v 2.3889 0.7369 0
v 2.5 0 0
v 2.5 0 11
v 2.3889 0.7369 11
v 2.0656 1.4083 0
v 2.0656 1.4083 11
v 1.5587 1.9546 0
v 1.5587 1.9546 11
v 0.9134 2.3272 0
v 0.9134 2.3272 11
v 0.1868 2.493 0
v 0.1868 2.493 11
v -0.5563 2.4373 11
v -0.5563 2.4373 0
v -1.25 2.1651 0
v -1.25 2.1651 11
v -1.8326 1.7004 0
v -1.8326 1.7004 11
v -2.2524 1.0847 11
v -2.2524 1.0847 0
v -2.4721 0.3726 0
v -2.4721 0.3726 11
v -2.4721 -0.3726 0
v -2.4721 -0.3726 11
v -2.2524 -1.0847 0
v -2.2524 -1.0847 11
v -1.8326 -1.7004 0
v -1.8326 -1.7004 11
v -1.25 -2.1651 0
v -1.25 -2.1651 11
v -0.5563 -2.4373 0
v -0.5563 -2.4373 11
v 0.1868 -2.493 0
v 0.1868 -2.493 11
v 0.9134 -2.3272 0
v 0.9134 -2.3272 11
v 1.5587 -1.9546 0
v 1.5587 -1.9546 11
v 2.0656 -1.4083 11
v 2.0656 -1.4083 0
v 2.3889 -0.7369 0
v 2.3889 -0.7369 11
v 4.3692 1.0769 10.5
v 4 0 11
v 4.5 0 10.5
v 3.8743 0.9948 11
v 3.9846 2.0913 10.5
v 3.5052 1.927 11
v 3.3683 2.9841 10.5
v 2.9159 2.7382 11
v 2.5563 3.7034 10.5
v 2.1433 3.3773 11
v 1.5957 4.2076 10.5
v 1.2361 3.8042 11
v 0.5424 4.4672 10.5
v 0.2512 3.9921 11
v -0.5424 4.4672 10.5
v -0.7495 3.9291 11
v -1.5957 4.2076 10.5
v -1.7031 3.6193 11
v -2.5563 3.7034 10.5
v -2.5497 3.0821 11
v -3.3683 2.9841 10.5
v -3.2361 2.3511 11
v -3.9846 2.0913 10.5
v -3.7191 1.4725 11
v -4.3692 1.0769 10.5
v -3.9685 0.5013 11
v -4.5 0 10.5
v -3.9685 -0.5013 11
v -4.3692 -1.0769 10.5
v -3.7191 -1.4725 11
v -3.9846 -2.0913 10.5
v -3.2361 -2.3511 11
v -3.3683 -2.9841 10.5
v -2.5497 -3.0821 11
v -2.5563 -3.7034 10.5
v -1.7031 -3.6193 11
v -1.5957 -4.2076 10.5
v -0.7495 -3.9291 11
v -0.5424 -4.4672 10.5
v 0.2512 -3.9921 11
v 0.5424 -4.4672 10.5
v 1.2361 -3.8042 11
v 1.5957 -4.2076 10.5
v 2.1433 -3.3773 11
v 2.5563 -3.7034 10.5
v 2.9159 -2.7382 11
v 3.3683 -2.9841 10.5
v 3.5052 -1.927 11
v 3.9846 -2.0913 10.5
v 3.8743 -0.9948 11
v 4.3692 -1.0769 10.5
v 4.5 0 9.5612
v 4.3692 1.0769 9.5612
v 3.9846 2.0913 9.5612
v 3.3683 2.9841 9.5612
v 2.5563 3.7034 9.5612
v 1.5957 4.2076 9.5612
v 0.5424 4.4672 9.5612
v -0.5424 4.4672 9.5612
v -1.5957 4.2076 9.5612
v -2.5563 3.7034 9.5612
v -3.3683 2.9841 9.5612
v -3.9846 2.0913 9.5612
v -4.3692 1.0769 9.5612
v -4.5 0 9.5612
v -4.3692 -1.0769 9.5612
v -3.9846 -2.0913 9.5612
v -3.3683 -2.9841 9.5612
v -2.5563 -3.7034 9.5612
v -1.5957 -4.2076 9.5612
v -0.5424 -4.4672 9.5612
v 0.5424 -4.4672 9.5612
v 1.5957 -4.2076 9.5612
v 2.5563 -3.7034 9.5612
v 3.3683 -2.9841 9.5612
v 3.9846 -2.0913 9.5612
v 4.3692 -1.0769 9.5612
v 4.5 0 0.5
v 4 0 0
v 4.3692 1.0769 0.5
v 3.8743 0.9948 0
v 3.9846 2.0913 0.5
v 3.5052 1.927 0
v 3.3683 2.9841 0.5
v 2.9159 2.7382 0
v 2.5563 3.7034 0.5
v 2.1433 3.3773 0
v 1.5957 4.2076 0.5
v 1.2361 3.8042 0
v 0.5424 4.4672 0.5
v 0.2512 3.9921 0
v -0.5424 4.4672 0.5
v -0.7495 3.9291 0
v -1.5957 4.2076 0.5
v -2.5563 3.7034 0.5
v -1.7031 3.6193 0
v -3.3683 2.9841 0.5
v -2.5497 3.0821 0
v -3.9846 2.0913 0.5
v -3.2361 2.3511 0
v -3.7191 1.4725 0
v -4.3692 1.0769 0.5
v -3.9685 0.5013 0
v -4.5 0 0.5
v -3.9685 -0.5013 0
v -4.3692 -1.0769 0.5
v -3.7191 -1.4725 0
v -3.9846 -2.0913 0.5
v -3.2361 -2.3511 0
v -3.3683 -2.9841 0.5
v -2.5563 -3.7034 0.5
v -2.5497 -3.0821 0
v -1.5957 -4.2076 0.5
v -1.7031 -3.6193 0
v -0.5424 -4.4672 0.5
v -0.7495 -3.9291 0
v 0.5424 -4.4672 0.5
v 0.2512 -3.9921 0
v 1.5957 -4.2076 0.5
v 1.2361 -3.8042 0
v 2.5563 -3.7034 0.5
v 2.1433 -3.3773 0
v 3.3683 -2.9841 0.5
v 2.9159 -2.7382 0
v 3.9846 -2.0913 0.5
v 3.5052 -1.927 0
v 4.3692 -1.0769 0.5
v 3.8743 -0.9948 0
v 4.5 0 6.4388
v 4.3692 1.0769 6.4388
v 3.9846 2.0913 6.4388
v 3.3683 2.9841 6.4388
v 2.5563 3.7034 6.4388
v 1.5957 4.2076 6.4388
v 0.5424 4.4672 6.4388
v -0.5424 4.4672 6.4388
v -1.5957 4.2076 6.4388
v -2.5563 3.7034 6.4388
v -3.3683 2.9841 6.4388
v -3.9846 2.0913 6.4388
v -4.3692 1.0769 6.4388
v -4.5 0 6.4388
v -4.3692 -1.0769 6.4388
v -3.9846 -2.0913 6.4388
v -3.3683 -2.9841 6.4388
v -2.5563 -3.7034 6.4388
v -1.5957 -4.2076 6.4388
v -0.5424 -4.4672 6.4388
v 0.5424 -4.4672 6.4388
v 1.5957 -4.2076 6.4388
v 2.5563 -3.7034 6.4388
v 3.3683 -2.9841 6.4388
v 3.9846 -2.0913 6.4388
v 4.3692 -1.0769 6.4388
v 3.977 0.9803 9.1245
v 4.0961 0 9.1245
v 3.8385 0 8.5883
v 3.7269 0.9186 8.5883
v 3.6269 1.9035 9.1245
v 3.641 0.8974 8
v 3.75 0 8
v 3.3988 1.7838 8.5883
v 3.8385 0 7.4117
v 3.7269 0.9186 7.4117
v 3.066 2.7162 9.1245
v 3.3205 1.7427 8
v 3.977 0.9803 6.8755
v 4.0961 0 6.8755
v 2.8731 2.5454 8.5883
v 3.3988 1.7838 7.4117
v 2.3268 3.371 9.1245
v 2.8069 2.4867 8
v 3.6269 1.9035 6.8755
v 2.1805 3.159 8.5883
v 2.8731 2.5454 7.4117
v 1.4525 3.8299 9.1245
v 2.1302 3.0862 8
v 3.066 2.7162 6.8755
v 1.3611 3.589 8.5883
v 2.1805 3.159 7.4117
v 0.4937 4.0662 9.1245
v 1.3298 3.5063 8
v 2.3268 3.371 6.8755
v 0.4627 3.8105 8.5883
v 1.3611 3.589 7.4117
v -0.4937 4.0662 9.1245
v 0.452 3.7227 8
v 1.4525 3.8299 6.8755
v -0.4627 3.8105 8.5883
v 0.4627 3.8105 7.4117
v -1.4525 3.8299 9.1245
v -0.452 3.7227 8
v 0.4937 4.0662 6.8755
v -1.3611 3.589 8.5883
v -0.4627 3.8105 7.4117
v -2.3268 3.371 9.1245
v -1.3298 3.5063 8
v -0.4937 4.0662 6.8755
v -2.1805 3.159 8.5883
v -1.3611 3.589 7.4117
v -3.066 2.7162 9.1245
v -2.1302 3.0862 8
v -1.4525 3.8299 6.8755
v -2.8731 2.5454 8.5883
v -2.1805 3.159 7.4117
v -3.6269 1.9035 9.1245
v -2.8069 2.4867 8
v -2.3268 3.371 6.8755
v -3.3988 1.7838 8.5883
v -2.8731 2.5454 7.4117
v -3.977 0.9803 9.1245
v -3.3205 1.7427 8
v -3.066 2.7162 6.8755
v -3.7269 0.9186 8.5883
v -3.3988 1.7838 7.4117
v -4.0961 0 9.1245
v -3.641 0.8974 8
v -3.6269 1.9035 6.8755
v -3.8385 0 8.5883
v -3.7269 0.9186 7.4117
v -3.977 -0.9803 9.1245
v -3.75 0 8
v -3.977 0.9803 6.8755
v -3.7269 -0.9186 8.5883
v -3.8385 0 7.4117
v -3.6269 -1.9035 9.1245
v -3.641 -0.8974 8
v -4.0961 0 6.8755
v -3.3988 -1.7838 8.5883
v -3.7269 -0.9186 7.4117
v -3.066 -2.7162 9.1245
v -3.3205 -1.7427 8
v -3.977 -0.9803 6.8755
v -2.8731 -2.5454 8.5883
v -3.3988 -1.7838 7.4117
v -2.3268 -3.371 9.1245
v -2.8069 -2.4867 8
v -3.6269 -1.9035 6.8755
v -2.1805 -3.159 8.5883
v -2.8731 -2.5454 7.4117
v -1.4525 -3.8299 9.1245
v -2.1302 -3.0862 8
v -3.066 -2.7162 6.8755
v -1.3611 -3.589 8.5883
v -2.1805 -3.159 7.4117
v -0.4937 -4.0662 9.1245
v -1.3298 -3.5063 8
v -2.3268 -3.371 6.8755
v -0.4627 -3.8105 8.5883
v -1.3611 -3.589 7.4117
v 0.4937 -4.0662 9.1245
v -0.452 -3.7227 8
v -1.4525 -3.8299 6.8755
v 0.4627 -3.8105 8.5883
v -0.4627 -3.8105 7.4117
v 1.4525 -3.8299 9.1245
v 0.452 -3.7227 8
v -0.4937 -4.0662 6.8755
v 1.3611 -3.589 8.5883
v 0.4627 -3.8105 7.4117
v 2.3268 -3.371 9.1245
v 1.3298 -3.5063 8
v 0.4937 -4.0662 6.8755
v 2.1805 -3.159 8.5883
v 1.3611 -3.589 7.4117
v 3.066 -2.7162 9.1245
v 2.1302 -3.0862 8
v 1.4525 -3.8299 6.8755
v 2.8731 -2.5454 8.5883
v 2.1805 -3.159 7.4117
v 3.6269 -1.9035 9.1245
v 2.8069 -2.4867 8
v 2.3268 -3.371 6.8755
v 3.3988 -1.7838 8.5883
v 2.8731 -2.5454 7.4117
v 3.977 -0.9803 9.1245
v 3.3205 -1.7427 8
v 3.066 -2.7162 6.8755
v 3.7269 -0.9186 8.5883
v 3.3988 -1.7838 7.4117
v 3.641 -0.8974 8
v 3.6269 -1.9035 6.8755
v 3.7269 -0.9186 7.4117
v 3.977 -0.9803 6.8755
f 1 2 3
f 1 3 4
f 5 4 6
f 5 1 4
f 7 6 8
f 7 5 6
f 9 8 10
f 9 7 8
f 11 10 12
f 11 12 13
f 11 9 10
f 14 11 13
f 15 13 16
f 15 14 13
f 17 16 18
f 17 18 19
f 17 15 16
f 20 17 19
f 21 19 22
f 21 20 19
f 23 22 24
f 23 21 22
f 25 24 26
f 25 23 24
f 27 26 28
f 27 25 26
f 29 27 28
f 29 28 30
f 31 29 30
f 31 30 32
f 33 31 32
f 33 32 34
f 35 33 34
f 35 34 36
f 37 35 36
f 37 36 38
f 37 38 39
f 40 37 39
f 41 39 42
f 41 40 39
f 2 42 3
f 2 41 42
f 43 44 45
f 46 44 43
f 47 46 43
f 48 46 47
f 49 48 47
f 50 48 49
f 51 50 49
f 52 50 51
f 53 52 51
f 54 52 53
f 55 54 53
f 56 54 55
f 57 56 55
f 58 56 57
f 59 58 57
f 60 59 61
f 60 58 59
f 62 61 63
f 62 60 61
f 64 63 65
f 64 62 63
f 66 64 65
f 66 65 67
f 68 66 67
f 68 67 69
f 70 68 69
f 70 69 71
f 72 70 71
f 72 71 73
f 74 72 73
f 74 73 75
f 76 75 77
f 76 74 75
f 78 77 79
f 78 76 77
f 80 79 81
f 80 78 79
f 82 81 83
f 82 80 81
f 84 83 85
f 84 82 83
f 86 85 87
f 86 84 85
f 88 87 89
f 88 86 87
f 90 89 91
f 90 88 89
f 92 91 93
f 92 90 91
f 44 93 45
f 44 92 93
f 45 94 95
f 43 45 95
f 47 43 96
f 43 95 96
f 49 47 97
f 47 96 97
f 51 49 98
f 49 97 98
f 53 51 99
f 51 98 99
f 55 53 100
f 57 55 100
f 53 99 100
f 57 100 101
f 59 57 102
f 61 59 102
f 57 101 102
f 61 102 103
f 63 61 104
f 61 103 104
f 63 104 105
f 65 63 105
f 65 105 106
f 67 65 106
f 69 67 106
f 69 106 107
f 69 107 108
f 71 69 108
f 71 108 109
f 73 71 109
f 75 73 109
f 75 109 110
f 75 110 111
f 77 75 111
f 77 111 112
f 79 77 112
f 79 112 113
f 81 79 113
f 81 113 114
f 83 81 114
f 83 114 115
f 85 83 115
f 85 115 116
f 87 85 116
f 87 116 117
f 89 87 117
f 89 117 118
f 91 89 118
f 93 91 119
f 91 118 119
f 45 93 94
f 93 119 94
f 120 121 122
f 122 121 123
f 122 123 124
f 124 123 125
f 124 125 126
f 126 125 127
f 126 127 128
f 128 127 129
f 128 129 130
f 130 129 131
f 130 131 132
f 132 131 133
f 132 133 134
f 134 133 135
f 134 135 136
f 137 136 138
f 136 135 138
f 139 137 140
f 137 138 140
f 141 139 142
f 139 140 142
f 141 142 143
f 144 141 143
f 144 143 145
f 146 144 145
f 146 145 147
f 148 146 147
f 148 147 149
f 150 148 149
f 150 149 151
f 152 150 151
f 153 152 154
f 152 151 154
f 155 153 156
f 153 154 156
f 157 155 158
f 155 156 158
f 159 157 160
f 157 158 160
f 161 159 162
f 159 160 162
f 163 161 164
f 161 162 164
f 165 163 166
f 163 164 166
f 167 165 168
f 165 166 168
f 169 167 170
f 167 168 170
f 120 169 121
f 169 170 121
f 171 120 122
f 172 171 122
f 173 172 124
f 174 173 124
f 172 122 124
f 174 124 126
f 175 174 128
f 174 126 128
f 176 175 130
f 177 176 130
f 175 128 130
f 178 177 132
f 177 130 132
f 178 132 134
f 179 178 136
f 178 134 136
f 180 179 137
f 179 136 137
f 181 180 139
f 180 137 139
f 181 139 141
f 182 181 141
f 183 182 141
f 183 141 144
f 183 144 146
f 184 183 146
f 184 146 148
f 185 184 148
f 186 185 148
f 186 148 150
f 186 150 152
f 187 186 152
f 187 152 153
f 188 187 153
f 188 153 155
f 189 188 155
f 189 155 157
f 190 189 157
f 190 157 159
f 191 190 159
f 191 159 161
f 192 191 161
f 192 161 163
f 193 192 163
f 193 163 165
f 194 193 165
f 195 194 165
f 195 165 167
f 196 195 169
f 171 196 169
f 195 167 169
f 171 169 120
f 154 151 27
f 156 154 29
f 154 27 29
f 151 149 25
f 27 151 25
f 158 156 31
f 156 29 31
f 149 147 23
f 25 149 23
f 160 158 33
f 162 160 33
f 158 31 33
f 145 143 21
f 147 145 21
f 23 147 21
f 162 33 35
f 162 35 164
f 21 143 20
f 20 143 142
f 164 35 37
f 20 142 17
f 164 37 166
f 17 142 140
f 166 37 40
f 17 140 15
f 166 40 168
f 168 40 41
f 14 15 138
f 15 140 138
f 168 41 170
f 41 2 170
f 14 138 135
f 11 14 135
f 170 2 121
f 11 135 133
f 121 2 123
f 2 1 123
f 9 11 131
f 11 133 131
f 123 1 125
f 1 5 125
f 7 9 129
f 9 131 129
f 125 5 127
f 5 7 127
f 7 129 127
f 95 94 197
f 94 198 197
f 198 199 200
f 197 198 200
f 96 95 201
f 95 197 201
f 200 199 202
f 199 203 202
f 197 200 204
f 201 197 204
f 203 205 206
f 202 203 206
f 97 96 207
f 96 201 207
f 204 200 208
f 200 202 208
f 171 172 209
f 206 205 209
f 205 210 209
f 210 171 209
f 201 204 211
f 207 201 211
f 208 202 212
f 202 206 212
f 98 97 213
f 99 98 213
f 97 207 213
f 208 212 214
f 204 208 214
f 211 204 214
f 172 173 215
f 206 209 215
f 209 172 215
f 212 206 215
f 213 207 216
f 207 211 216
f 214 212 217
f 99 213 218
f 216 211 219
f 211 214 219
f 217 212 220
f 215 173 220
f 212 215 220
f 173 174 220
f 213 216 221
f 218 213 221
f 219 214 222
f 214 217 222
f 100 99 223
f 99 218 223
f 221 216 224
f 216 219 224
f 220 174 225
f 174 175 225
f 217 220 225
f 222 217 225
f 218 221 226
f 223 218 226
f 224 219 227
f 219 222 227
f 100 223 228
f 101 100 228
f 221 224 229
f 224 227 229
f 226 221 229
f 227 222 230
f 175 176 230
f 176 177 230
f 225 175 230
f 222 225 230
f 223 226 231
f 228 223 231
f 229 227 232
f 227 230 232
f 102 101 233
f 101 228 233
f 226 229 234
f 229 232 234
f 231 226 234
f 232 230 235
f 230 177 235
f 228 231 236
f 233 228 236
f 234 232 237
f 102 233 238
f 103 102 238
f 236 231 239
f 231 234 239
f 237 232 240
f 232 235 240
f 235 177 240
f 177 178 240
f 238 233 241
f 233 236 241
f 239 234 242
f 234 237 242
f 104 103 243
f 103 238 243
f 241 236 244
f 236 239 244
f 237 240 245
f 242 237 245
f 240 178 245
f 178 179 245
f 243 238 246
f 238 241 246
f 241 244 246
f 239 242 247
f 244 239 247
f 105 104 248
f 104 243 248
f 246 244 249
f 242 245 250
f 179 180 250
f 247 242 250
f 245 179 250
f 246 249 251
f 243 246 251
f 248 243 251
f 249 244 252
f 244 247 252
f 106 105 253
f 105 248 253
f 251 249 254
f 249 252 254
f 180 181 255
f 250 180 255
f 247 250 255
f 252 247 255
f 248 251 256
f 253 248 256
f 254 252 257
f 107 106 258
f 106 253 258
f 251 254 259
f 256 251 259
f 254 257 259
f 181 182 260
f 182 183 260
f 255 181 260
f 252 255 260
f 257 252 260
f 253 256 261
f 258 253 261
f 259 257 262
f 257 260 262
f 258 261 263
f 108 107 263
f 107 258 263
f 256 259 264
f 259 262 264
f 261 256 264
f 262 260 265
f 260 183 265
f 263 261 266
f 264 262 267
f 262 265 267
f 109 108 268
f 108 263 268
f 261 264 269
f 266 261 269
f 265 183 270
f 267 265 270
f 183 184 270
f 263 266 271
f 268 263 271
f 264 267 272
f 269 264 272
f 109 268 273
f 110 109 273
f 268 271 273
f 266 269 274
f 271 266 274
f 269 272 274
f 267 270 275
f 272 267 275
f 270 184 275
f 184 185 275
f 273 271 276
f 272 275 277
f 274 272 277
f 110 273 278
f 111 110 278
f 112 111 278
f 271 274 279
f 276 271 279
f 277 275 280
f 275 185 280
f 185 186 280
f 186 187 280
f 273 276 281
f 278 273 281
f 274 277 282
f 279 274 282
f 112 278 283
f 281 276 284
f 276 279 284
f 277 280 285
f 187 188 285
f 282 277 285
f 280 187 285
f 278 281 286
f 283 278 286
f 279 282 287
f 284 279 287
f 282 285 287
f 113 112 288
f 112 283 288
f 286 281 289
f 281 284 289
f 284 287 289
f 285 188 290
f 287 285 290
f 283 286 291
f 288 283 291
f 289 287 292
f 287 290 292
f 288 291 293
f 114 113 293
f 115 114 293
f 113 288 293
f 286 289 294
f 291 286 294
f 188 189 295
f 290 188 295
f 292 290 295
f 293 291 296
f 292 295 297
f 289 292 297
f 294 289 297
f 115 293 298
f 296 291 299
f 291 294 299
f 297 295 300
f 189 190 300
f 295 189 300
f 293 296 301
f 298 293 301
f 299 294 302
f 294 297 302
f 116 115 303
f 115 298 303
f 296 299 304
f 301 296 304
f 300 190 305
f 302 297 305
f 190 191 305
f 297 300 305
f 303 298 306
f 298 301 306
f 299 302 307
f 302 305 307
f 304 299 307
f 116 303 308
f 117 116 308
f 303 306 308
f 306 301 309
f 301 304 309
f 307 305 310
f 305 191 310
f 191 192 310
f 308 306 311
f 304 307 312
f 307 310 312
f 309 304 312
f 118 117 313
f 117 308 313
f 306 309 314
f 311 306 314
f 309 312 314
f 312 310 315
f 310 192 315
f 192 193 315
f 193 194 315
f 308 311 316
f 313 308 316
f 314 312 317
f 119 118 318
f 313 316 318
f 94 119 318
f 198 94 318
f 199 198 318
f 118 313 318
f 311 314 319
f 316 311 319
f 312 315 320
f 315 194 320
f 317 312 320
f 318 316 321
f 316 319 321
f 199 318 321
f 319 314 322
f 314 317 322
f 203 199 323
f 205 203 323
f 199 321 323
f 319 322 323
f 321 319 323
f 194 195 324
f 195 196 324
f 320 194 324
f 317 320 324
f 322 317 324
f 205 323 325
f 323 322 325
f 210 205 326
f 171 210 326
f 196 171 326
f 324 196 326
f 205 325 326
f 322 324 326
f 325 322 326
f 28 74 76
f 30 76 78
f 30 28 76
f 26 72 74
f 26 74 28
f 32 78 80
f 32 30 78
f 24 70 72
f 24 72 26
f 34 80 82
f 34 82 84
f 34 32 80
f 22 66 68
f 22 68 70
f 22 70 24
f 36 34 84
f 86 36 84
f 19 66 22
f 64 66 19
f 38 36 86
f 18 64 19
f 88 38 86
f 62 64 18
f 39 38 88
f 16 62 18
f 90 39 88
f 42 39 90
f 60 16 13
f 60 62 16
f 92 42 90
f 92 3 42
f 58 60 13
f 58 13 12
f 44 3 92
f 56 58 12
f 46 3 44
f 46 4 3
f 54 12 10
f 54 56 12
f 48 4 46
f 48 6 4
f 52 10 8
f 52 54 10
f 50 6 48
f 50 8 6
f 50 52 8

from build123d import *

# Parameters (mm, degrees)
CROQUIS1_R              = 4.5
CROQUIS1_R_2            = 2.5
SALIENTE_EXTRUIR1_DEPTH = 11
CHAFL_N1_SIZE           = 0.5


# Read off the part's stored shape, not the designer's step: Cortar-Barrer1
with BuildPart() as part:
    # Croquis1 → Saliente-Extruir1 (new body)
    with BuildSketch(Plane.XY):
        Circle(CROQUIS1_R)
        Circle(CROQUIS1_R_2, mode=Mode.SUBTRACT)
    extrude(amount=SALIENTE_EXTRUIR1_DEPTH)

    # Chaflán1
    chafl_n1_edges = [part.edges().sort_by_distance(p)[0] for p in [
        (-4.5, 0, 0),
        (-4.5, 0, 11),
    ]]
    chamfer(chafl_n1_edges, length=CHAFL_N1_SIZE)

    # Cortar-Barrer1 outline → Cortar-Barrer1 (revolve, cut)
    with BuildSketch(Plane.XZ):
        with BuildLine():
            Line((4.5, 6.4387505), (4.5, 9.5612495))
            ThreePointArc((4.5, 9.5612495), (3.75, 8), (4.5, 6.4387505))
        make_face()
    revolve(axis=Axis((0, 0, 0), (0, 0, 1)), mode=Mode.SUBTRACT)


solid = part.part
